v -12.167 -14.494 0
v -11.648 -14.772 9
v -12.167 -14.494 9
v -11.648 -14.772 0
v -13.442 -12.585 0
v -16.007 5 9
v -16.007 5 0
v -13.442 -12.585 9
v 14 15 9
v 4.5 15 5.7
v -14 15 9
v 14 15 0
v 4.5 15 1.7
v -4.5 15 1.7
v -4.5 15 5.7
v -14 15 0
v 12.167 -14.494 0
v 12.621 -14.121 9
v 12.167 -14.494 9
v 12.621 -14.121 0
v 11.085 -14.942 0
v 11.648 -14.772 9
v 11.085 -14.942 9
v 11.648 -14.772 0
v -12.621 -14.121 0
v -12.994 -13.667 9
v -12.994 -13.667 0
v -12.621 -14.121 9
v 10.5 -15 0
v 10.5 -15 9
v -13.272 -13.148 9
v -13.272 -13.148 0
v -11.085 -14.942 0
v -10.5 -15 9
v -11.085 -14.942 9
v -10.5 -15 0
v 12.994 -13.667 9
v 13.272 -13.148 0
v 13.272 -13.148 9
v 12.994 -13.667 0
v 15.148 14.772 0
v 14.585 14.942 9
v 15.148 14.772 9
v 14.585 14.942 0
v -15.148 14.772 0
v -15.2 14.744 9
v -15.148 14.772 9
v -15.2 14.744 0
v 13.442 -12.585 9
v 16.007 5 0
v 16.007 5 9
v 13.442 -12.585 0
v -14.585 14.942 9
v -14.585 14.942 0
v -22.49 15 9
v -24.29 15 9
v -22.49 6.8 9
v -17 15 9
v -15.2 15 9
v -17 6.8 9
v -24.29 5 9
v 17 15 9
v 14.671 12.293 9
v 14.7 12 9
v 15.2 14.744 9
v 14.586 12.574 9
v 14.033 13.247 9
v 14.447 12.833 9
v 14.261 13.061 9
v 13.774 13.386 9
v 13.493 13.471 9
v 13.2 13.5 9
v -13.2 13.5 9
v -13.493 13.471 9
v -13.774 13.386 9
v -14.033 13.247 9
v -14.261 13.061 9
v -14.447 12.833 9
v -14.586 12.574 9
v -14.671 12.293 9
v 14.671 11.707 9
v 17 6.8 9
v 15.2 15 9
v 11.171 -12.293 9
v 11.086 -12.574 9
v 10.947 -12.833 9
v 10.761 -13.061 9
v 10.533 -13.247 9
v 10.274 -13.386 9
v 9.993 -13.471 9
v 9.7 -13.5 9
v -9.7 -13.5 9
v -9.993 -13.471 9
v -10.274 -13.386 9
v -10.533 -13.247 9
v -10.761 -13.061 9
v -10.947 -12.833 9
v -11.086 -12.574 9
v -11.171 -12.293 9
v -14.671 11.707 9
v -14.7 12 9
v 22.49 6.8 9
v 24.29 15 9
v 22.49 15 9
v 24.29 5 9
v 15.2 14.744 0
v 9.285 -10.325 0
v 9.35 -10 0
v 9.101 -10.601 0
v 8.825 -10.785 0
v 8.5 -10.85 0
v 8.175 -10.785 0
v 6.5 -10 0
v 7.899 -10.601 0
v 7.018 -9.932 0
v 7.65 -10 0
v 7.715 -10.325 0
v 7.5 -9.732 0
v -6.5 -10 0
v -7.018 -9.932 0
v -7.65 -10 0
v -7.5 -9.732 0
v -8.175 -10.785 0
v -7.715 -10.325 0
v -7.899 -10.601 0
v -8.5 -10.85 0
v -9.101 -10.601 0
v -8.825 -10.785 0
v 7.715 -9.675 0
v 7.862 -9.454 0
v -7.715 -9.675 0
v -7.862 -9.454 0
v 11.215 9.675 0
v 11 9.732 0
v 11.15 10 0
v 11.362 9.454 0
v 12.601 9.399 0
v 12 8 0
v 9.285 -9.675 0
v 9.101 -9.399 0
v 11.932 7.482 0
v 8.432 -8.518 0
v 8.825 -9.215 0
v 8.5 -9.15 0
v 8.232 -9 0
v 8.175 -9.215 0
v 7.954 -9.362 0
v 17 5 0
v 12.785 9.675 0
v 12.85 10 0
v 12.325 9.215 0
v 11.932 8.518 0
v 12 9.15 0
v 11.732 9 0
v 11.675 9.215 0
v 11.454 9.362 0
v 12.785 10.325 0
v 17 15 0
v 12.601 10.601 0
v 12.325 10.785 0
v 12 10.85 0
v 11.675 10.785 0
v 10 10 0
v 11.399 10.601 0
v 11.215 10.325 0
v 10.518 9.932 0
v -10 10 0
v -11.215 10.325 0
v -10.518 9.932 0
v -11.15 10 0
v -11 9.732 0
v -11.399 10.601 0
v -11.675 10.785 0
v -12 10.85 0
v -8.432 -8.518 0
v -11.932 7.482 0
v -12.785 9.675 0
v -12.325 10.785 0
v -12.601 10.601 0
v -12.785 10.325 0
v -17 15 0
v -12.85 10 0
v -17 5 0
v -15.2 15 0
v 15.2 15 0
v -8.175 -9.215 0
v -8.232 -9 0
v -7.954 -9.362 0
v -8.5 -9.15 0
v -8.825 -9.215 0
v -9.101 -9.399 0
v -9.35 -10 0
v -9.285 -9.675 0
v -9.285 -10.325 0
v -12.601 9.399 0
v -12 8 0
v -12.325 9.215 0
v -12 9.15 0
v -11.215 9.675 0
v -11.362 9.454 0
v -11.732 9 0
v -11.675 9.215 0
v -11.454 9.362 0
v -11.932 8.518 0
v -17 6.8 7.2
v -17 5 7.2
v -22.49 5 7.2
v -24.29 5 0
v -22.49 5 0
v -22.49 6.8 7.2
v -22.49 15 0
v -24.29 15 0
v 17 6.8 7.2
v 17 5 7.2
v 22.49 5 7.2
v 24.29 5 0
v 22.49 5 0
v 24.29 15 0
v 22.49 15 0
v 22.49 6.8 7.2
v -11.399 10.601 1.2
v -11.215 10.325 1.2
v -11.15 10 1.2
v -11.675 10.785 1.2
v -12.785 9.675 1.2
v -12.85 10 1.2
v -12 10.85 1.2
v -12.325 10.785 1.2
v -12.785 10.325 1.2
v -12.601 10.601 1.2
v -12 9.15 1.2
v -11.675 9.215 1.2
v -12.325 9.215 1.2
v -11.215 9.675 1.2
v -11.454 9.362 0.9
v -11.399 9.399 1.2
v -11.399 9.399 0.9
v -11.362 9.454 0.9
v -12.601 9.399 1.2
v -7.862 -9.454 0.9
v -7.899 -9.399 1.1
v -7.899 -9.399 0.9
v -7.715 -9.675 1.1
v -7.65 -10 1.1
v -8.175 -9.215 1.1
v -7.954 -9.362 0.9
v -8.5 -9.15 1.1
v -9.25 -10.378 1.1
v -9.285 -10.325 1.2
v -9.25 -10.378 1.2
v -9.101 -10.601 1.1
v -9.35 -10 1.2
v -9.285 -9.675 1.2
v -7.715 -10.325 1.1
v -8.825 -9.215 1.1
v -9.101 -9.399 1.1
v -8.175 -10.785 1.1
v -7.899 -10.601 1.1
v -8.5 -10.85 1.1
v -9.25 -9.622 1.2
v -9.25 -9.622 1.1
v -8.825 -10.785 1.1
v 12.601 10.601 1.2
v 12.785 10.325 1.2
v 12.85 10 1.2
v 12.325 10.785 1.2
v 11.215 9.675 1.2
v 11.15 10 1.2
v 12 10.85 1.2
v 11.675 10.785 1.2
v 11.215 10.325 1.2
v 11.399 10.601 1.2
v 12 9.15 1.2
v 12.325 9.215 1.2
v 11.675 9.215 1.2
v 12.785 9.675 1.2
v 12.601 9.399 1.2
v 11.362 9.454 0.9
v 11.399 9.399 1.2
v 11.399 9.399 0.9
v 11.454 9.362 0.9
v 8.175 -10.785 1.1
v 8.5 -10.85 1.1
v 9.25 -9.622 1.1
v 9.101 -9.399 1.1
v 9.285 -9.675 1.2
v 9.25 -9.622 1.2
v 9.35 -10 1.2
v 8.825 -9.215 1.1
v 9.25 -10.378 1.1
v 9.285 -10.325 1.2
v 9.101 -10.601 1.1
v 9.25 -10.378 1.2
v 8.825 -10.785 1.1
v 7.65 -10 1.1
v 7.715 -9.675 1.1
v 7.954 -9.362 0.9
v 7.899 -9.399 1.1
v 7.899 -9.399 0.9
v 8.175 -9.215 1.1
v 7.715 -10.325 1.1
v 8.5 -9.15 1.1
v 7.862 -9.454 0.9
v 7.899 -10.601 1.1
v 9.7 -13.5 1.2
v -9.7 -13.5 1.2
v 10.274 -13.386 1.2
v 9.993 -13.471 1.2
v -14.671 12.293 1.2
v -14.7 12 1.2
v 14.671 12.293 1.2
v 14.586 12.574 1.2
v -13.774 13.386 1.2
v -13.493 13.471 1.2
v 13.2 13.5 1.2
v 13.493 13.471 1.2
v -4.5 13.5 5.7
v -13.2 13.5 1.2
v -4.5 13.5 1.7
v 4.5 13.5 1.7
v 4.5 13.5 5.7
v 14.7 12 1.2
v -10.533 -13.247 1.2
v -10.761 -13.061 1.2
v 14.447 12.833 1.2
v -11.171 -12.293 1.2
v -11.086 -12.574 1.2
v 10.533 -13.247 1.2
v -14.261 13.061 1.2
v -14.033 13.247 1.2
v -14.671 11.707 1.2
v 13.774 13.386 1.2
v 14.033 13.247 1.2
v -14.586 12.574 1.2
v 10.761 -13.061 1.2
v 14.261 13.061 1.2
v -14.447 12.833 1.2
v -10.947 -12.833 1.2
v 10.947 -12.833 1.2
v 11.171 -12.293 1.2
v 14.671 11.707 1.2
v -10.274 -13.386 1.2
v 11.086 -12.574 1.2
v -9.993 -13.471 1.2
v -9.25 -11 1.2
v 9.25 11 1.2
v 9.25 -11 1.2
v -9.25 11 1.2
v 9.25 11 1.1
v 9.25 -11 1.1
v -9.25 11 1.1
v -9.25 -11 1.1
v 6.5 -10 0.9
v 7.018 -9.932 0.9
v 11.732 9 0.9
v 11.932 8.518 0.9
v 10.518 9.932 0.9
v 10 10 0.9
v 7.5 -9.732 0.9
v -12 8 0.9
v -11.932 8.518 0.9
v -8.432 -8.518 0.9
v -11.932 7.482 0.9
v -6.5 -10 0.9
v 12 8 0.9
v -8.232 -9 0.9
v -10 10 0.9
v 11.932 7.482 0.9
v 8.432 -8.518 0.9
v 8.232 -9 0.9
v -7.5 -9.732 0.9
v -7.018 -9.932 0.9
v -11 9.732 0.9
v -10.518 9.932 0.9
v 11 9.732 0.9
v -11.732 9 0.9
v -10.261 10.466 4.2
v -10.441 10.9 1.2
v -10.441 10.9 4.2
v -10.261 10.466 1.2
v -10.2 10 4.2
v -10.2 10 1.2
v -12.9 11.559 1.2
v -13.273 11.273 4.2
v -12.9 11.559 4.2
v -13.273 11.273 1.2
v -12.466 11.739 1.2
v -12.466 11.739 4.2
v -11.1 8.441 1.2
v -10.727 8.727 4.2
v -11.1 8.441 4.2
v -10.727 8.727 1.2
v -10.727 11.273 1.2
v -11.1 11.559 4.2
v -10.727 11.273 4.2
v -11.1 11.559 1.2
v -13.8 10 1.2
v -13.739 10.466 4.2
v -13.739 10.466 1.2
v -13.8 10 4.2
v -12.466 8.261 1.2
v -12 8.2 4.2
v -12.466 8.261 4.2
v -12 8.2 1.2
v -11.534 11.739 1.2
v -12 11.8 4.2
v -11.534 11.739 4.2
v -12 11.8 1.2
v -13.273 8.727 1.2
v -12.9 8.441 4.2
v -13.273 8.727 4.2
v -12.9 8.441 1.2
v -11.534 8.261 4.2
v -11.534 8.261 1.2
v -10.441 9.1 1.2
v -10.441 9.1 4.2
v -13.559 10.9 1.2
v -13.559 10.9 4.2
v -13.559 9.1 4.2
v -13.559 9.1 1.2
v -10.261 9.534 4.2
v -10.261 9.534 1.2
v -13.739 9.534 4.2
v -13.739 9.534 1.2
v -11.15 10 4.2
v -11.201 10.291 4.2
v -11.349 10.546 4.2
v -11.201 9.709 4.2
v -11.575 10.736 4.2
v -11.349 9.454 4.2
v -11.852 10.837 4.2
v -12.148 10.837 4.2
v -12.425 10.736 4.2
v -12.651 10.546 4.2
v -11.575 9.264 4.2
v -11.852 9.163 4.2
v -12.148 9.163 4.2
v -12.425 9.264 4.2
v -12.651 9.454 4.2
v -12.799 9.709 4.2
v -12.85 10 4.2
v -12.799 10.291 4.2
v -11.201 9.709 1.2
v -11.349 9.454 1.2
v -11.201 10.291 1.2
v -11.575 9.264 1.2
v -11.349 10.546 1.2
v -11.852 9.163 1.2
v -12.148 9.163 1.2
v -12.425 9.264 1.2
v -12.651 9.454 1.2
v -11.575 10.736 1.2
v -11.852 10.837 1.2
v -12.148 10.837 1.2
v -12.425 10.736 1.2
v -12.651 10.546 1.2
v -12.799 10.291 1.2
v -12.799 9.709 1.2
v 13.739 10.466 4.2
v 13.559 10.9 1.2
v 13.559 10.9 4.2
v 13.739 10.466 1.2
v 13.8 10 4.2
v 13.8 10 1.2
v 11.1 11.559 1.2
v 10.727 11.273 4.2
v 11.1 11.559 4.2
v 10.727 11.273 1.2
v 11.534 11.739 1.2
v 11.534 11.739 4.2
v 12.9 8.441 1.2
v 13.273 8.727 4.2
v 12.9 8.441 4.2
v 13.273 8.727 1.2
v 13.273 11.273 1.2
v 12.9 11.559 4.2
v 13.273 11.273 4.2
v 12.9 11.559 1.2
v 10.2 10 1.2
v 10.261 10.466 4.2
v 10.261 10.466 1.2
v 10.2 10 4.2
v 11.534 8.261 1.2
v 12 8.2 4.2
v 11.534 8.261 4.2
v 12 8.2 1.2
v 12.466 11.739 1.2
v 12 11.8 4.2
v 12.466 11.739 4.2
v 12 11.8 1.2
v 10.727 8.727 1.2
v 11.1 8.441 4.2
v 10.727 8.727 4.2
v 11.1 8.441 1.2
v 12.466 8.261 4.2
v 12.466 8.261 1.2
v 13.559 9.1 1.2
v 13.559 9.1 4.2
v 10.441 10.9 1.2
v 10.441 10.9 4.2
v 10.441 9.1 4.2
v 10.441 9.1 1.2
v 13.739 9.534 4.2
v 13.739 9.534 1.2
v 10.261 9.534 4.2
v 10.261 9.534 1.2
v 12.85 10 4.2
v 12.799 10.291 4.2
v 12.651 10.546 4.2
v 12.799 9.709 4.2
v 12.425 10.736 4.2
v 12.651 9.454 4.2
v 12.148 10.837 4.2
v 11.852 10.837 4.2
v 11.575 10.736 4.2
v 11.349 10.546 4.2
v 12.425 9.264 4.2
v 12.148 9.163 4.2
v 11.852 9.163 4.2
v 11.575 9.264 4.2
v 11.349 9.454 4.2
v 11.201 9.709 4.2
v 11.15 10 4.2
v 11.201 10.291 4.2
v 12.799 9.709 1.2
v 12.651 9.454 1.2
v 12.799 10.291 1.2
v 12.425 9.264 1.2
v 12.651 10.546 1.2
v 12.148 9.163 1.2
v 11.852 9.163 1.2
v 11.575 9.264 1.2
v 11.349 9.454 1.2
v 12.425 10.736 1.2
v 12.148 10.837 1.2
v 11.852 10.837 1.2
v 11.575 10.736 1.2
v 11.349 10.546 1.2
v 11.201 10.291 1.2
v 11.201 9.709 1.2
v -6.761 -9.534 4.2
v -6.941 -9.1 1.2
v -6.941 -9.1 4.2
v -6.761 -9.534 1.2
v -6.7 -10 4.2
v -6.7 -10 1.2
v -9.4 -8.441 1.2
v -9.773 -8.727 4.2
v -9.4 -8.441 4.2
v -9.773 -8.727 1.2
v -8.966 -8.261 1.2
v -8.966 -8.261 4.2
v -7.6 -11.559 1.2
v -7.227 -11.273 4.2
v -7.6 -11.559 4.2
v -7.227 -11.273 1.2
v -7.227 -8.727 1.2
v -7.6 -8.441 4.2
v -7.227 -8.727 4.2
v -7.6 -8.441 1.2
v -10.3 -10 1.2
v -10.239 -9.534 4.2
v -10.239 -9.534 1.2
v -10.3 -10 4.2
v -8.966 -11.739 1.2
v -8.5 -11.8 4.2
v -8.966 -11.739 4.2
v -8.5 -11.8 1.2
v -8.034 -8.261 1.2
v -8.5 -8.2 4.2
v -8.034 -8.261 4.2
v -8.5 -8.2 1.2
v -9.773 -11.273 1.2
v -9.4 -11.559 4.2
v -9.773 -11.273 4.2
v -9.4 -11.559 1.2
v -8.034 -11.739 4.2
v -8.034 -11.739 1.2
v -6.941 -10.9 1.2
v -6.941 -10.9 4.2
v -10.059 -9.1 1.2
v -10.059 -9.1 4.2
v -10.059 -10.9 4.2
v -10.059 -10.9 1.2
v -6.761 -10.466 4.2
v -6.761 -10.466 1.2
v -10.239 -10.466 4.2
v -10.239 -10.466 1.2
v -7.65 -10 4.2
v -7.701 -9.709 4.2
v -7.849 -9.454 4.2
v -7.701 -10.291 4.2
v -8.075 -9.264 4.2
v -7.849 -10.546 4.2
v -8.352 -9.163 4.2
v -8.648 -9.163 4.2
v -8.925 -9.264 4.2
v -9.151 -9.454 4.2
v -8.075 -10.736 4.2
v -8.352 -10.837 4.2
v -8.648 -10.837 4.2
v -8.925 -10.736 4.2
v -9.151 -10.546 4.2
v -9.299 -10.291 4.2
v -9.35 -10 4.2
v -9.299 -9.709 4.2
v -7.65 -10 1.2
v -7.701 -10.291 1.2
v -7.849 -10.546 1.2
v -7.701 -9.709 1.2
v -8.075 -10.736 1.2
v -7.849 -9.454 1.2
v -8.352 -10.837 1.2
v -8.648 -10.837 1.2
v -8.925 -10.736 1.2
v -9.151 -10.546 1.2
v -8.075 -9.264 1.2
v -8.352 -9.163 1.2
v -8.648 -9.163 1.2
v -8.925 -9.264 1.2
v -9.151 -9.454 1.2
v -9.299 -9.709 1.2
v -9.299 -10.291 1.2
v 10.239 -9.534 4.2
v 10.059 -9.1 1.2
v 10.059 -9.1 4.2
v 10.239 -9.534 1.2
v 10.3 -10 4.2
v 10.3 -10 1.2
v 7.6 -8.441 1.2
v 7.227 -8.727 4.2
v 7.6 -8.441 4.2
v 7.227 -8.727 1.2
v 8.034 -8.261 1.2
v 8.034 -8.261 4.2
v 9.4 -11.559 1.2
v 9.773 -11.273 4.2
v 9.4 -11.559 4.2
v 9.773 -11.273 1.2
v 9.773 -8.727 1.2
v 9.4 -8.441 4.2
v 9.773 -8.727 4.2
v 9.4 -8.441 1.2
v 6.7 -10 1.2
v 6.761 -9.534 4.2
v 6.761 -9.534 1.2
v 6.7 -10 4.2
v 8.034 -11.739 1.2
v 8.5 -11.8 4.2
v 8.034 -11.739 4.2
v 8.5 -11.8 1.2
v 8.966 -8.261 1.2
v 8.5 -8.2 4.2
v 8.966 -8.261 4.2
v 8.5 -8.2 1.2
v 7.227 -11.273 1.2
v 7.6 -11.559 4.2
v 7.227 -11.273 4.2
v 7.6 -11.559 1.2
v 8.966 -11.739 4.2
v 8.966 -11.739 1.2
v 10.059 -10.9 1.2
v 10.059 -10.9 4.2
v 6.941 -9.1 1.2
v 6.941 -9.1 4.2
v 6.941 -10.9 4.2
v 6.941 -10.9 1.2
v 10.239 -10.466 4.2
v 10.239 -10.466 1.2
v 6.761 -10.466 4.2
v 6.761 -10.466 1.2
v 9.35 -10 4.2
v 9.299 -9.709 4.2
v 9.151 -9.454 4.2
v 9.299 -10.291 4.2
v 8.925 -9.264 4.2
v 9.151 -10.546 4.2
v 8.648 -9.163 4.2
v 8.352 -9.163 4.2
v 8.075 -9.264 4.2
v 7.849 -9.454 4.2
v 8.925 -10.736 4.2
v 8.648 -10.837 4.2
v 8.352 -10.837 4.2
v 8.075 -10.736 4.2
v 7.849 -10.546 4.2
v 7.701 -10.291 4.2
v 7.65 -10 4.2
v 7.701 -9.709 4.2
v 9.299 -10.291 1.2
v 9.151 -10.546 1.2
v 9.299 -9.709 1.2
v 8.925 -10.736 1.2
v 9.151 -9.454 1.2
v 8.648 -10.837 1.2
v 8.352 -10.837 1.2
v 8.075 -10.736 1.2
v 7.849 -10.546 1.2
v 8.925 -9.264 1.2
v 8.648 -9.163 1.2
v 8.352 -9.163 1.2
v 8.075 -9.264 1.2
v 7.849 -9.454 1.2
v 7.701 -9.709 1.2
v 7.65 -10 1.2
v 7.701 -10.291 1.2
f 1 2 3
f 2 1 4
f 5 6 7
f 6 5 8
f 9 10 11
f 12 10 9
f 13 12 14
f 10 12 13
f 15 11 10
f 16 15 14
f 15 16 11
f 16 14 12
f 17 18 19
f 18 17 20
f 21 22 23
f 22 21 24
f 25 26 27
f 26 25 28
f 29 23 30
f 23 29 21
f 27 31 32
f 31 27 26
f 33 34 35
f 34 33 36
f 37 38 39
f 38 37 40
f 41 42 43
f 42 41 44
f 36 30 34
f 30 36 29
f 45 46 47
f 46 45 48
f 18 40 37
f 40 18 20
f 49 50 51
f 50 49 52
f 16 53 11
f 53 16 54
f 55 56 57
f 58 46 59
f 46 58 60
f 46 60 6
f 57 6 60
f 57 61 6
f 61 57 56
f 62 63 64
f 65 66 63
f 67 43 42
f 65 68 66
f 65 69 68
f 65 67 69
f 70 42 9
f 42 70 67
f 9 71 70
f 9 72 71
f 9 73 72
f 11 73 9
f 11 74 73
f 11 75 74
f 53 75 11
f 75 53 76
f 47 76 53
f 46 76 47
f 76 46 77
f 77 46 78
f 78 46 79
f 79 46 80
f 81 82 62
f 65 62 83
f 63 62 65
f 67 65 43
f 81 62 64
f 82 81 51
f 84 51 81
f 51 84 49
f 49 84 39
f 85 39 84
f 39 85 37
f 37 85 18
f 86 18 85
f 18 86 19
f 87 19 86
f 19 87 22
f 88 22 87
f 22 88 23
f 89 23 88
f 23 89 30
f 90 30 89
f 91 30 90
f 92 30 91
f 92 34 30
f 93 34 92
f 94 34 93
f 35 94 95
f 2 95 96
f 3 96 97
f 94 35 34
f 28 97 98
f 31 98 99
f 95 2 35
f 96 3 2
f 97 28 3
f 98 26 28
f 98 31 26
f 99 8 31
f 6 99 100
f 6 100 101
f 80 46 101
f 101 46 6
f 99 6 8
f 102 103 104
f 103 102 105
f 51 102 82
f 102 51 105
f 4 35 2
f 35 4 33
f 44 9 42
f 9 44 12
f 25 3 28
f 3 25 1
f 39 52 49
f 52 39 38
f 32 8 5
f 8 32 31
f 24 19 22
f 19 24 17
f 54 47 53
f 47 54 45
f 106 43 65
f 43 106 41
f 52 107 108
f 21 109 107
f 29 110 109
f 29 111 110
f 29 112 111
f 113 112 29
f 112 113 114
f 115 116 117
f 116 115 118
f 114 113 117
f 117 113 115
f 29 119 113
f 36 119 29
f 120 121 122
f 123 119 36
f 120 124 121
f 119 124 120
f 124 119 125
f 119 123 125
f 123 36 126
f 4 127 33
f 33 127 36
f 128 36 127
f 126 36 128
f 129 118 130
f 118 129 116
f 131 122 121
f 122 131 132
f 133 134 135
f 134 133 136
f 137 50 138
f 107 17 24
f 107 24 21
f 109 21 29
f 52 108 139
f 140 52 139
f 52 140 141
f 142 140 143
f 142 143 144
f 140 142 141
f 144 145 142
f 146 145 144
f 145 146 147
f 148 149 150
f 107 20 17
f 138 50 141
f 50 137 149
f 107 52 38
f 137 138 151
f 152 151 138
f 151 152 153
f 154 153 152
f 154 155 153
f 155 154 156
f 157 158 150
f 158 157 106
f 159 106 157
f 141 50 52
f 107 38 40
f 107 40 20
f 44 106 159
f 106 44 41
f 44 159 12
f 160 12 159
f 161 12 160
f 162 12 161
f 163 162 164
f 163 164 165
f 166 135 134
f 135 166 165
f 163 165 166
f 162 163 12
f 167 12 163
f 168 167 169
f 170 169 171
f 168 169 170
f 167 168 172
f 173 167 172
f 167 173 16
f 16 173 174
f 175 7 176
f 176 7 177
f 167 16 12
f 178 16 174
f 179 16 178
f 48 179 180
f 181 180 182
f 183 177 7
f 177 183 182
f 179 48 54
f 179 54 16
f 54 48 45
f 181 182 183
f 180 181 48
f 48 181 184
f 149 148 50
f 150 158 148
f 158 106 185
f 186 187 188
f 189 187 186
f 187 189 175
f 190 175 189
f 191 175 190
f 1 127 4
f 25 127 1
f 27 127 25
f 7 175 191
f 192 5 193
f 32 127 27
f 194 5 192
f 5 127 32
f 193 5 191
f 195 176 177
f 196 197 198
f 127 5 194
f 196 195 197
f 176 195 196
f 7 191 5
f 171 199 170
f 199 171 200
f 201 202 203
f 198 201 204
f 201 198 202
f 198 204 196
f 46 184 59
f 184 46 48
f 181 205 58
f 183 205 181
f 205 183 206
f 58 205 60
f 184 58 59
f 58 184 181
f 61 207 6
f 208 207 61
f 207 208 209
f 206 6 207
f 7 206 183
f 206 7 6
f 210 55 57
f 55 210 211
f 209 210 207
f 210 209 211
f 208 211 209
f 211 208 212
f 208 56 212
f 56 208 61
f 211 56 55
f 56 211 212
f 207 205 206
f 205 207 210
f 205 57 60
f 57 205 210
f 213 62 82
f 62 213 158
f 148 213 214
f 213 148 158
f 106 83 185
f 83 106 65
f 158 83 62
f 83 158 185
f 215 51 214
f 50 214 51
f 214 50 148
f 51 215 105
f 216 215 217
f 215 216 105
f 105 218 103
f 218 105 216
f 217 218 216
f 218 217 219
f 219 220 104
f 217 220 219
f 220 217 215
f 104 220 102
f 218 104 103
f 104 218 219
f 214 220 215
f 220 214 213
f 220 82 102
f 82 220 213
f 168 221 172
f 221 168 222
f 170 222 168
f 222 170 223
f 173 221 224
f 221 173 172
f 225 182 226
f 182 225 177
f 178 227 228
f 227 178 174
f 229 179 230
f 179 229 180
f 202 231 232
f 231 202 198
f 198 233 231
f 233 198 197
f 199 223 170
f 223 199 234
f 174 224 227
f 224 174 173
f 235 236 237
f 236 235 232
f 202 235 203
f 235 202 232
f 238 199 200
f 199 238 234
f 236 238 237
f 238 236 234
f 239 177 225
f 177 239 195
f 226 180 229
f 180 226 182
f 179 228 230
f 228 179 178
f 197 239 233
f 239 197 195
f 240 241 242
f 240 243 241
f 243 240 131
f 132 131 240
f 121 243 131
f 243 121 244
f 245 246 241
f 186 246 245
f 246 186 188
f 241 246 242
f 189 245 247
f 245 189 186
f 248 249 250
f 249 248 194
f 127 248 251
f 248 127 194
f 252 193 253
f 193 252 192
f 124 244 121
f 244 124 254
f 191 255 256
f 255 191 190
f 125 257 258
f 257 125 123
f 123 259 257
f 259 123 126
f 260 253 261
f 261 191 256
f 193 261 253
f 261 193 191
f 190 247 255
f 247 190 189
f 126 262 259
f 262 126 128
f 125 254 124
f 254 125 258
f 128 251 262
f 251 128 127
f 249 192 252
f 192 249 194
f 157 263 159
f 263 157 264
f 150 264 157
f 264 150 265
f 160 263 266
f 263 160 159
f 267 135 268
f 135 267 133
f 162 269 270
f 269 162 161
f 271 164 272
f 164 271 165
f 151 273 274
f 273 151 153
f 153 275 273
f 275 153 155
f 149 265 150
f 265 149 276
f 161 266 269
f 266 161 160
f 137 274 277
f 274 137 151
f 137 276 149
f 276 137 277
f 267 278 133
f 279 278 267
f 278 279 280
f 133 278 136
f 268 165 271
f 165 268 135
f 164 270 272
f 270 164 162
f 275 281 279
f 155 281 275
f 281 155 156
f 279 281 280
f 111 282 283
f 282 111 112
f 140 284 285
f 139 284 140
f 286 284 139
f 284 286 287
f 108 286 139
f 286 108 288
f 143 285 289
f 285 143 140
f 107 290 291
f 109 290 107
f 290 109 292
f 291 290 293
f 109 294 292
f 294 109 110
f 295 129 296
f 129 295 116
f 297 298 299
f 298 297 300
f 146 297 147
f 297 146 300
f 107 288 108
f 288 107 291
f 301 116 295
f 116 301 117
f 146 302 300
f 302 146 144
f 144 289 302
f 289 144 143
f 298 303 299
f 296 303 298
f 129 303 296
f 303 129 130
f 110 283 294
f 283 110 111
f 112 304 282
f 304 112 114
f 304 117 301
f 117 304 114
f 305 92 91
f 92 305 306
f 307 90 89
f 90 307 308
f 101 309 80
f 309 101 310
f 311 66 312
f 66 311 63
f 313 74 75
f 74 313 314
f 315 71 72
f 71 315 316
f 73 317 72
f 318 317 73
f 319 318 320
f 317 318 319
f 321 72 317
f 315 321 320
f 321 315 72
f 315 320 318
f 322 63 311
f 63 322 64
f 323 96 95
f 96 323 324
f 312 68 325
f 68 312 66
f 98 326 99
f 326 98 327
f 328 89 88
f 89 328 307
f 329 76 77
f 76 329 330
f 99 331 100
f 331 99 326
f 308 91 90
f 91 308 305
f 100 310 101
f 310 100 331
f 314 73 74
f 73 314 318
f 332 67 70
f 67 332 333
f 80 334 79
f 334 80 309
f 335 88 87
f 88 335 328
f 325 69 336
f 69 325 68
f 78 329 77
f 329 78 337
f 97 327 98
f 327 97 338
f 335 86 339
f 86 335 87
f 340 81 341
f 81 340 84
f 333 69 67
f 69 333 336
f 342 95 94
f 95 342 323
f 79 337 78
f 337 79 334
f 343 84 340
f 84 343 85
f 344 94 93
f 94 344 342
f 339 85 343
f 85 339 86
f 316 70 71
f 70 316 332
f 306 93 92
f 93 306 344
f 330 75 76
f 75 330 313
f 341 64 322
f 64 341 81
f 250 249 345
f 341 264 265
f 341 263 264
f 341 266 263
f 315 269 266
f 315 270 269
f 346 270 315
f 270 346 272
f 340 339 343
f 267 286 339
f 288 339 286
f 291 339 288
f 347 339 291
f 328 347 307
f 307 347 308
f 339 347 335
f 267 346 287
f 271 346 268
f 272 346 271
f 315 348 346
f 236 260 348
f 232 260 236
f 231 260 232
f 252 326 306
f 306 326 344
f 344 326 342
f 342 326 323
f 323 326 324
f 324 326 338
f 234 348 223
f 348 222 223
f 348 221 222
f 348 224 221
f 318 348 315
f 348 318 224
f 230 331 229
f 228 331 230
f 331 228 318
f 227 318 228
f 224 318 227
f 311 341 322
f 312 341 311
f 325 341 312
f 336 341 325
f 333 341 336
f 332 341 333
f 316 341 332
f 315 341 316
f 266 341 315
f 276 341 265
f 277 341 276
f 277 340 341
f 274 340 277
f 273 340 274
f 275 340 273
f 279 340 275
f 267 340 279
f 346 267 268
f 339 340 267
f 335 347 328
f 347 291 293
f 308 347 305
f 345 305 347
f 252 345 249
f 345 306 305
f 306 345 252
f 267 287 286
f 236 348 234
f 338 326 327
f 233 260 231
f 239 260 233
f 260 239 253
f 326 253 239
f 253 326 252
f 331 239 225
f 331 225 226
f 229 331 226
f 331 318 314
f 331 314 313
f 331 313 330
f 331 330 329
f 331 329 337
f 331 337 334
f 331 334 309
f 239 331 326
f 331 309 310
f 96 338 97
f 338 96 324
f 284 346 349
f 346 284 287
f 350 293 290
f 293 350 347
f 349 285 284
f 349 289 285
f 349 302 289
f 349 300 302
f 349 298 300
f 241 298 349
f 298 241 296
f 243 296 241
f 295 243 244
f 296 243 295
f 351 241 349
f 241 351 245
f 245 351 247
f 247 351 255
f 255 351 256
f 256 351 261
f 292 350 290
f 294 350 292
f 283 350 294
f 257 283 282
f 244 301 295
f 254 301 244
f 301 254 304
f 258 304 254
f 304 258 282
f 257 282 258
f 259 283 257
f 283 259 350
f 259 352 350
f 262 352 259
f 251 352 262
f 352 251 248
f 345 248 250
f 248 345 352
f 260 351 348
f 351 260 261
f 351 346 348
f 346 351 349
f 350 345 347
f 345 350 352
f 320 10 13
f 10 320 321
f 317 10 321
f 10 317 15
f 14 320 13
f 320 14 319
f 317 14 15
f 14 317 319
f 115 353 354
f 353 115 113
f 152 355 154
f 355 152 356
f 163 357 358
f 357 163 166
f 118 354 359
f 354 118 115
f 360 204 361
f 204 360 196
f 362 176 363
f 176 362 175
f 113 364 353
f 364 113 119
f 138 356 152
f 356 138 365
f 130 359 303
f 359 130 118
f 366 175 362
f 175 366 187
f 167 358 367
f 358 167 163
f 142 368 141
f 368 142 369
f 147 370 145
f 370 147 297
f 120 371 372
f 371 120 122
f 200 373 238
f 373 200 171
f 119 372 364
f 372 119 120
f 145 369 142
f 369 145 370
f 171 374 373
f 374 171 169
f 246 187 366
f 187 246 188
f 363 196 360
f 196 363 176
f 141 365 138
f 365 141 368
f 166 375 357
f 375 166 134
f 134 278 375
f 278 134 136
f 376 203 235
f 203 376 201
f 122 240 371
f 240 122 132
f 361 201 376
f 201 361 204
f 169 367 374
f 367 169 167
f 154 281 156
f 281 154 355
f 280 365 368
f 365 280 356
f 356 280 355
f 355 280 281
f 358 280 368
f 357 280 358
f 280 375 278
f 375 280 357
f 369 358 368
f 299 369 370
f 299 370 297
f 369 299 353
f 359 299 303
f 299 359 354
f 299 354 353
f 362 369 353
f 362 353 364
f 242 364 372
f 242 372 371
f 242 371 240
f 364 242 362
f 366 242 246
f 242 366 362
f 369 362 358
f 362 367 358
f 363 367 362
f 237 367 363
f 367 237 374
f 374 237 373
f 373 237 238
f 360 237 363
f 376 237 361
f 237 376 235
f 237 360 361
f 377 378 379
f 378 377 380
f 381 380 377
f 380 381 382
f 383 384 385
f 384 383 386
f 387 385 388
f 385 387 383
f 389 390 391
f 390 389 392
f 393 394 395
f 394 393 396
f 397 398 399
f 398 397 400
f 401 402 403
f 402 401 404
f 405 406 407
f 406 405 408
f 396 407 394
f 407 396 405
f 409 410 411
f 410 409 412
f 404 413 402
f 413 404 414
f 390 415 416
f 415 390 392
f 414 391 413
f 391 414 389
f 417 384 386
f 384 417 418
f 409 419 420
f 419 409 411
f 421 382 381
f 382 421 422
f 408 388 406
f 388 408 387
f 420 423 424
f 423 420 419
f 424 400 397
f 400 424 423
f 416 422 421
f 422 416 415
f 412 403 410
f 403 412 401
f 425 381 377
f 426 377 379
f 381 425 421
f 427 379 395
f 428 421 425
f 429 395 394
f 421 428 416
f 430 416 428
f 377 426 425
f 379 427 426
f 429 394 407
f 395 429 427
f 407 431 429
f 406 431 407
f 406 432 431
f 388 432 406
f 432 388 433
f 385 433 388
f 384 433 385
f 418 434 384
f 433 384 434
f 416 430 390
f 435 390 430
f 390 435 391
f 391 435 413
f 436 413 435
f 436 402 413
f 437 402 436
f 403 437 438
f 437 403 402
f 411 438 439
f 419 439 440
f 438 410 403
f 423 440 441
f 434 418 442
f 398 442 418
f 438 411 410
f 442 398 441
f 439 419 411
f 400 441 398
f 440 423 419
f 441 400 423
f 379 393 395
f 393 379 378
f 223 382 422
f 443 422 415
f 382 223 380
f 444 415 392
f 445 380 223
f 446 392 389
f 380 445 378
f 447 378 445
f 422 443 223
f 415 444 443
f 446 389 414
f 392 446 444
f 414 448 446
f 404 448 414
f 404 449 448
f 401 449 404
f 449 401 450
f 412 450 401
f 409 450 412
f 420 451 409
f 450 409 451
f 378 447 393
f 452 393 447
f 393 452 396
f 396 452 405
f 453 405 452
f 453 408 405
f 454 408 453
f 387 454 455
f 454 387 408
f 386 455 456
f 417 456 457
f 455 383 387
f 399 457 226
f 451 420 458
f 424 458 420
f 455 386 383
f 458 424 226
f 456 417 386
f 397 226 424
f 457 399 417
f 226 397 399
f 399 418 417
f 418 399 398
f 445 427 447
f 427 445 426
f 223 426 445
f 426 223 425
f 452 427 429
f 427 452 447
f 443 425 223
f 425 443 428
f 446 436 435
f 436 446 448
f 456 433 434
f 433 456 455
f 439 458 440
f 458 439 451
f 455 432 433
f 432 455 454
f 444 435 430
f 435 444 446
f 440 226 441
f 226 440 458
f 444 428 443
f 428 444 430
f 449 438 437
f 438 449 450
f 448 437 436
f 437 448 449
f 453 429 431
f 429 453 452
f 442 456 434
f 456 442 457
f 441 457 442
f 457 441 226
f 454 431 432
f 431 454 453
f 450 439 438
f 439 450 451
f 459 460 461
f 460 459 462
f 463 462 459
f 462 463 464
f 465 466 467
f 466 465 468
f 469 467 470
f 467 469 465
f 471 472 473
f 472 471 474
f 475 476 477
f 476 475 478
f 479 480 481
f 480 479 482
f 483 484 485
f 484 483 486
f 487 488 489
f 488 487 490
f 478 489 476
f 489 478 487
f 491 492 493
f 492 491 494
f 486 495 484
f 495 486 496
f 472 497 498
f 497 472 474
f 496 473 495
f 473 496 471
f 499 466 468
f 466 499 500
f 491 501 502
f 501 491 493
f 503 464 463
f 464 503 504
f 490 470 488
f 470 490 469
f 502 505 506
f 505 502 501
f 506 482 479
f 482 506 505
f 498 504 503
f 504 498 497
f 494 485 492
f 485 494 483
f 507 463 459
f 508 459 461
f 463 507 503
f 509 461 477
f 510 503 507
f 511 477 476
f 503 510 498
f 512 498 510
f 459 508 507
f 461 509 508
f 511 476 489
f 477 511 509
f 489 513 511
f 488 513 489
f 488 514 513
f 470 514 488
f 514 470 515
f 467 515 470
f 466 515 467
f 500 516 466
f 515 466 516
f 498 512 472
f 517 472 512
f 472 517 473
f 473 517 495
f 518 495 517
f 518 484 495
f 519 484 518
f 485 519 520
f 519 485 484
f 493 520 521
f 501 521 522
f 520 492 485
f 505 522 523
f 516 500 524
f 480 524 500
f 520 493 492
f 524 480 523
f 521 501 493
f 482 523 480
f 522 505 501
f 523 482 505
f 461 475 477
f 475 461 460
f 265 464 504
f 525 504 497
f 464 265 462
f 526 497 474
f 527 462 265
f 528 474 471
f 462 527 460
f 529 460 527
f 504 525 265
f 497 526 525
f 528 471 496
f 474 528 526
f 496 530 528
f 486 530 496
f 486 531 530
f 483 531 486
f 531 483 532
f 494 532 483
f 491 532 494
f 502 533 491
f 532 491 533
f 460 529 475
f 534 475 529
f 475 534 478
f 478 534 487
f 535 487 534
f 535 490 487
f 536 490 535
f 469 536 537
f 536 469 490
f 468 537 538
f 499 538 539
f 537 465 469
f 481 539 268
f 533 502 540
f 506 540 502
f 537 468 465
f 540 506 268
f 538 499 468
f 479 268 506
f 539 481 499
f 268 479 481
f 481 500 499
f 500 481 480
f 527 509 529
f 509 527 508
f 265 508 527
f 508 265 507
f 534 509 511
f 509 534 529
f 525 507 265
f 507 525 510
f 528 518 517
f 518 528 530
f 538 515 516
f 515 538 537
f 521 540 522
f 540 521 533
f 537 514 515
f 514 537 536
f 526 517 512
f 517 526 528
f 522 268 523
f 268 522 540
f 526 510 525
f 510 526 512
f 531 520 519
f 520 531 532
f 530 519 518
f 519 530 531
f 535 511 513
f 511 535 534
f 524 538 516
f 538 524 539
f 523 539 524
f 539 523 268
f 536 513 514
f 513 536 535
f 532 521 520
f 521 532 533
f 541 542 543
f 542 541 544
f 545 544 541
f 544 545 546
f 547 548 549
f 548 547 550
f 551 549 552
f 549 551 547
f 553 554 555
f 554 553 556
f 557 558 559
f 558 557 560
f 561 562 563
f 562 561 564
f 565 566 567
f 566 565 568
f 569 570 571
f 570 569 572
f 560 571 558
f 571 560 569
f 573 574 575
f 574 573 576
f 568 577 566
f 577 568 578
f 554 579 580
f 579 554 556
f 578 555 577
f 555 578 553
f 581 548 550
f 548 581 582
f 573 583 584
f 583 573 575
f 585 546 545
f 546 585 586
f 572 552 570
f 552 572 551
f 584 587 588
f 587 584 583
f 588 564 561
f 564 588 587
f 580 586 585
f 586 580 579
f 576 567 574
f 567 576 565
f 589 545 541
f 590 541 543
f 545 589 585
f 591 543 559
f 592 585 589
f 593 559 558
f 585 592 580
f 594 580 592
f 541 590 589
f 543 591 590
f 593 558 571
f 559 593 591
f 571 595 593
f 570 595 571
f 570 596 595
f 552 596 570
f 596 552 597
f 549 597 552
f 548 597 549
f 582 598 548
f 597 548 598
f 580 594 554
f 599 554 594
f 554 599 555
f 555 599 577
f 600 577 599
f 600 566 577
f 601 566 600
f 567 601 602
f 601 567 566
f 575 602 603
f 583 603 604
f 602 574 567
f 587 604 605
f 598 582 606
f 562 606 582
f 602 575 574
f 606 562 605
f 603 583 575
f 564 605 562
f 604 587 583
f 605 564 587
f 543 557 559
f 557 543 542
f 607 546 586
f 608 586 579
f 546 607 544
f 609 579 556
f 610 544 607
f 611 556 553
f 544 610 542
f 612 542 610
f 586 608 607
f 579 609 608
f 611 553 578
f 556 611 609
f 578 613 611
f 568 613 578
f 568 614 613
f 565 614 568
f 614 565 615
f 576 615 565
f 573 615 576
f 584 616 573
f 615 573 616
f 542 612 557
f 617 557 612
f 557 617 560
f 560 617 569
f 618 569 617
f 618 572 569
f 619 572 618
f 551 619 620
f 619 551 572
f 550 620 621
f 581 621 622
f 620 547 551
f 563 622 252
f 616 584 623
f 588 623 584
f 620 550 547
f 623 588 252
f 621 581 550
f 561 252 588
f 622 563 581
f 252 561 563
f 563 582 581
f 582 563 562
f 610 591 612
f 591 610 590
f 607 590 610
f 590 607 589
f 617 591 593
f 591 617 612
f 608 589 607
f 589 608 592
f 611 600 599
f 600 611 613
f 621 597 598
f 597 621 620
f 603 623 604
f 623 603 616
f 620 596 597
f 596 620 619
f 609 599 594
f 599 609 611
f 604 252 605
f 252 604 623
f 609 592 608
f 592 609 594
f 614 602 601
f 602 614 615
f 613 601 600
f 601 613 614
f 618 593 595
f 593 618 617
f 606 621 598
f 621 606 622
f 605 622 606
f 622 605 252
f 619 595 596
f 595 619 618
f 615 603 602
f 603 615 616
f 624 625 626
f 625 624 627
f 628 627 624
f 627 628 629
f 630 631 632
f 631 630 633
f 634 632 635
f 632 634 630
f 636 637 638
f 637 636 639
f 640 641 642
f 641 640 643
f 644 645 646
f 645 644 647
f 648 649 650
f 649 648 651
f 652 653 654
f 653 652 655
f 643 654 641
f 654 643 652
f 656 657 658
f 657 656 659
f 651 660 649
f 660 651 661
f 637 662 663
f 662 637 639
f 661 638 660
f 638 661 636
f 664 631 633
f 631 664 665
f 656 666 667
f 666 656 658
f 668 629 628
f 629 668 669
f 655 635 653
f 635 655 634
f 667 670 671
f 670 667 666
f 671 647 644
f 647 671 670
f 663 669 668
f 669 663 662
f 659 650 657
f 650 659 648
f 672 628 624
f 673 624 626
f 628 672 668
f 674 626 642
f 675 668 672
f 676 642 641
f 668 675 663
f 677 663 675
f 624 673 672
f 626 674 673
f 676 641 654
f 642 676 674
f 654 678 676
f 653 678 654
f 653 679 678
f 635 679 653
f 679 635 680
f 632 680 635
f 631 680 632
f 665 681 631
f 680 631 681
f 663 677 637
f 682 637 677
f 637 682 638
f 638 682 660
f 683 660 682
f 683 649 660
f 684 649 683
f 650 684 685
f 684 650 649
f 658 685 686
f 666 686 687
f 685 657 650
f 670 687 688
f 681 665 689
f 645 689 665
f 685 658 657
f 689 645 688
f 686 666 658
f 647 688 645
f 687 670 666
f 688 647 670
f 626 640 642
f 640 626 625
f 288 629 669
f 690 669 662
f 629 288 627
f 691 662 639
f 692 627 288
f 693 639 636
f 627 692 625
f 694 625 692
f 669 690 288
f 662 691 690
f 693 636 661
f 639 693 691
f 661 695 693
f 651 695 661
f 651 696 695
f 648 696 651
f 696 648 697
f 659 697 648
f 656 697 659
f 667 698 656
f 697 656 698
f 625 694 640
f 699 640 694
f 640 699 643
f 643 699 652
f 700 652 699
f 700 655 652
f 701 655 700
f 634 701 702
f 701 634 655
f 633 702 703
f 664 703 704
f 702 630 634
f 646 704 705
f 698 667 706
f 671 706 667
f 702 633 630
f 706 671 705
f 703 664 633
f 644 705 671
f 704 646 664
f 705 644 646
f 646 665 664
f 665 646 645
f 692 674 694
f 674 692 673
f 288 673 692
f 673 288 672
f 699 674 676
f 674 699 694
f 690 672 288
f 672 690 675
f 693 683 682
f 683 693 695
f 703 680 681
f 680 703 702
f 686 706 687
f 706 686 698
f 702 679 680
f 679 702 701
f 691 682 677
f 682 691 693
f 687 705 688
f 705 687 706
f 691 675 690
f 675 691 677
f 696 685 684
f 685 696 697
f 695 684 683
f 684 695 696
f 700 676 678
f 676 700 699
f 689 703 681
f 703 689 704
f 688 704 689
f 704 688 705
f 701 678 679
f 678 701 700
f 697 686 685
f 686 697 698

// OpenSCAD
// ============================================================
// PickleScore™ Throat Pod Enclosure — v4.0  2-BUTTON / LIPO
// Parametric OpenSCAD model
// ============================================================
// WHAT'S NEW IN v2.0:
//   - Tapered trapezoid body matching JOOLA Perseus throat taper
//   - Top width 65mm (at USA Approved level), bottom 27mm (grip collar)
//   - Height 65mm total — extends slightly above 25mm gap for fit
//   - Slim 7mm total thickness (down from 9mm in v1)
//   - XIAO nRF52840 oriented lengthwise (21mm along pod height)
//   - CR2032 holder stacked above XIAO chip (vertical stack layout)
//   - Clip arms at TOP of pod only (widest point, best grip)
//   - Full-length VHB pad on back face for secondary adhesion
//   - Buttons repositioned for tapered face geometry
// ============================================================
// PHASE 2 NOTE:
//   This design uses the Seeed XIAO nRF52840 (21×17.5mm)
//   for prototype builds. Phase 3 production will swap to
//   the Raytac MDBT50Q bare module (15.5×10.5×2mm) on a
//   custom PCB — enabling a pod that fits entirely within
//   the 25mm grip transition zone.
// ============================================================
// PRINT SETTINGS:
//   Material:      TPU 95A
//   Layer height:  0.15mm
//   Infill:        30% gyroid
//   Supports:      None needed
//   Orientation:
//     Top shell   → print face-down (buttons facing bed)
//     Bottom shell → print flat-side-down
// ============================================================
// TO USE:
//   SHOW = "assembly"    — full preview with components
//   SHOW = "top"         — top shell only (export STL)
//   SHOW = "bottom"      — bottom shell only (export STL)
// ============================================================

SHOW = "bottom";   // "assembly" | "top" | "bottom"

// ── Tapered body dimensions ──────────────────────────────────
// Trapezoid: wide at top (paddle face level), narrow at bottom (grip)
pod_h      = 30;    // mm — LiPo (25mm) + margins
pod_top_w  = 34;    // mm — 2-button layout, verify against paddle throat
pod_bot_w  = 27;    // mm — measured throat width
pod_thk    = 11;    // mm — floor(1.2) + XIAO(4) + LiPo(3.5) + top(1.8) stacked

// ── Shell thicknesses ────────────────────────────────────────
wall_t   = 1.8;  // mm — outer wall thickness all sides
top_t    = 1.8;  // mm — button face shell thickness
bot_h    =  9;  // mm — floor(1.2) + XIAO(4) + LiPo(3.5) stacked
floor_t  = 1.2;  // mm — bottom floor thickness

// ── Clip arms (grip paddle edge — TOP of pod only) ───────────
clip_gap    =  5.49; // mm — JOOLA Perseus edge guard height (measured)
clip_len    = 10.0;  // mm — arm length reaching over edge
clip_thk    =  1.8;  // mm — arm wall thickness
clip_offset = 10.0;  // mm — inset from left/right ends at top

// ── Button hole1s (inverted-triangle on tapered face) ─────────
// Positioned in upper portion of pod face, centered
btn_A_x  =  -8;  btn_A_y =   5;  btn_A_r = 5.0;  // Red  (left)  — short press = A scores, long = undo, 3s = reset
btn_B_x  =   8;  btn_B_y =   5;  btn_B_r = 5.0;  // Blue (right) — short press = B scores, long = undo, 3s = reset

// ── XIAO nRF52840 pocket (oriented lengthwise) ───────────────
// Board: 21mm long × 17.5mm wide × 3.5mm thick
// Positioned in upper half of pod
xiao_len  = 22.0;  // mm — board length + 0.5mm clearance
xiao_wid  = 18.5;  // mm — board width + 1mm clearance
xiao_thk  =  4.0;  // mm — board + component height
xiao_y    =  0;  // mm — centered in pod
xiao_x    =  0;  // mm — centered in pod
usbc_w    =  9.0;  // mm — USB-C cutout width
usbc_h    =  4.0;  // mm — USB-C cutout height

// ── LiPo battery (stacked above XIAO in z) ───────────────────
// Target: 301230 (3mm × 12mm × 30mm, ~90mAh)
// XIAO nRF52840 has built-in LiPo charger — USB-C charges both
lipo_len   = 26.0;  // mm — 25mm cell + 1mm clearance
lipo_wid   = 13.0;  // mm — 12mm cell + 1mm clearance
lipo_thk   =  3.5;  // mm — 3mm cell + 0.5mm clearance
lipo_y     =    0;  // mm — centered in pod
lipo_x     =    0;  // mm — centered in pod

// ── VHB adhesive pad recess (full back face) ─────────────────
// Slightly inset from edges for clean appearance
pad_margin = 4;    // mm — margin from pod edge
pad_depth  = 0.8;  // mm — recess depth

// ── Screw bosses (M1.6) ──────────────────────────────────────
boss_r     = 1.8;
boss_h     = 3.0;
screw_r    = 0.85;
boss_inset_x = 5.0;  // mm from left/right edge
boss_inset_y = 5.0;  // mm from top/bottom edge

// ── Fillet radius ─────────────────────────────────────────────
fillet_r = 3.0;

// ============================================================
// TRAPEZOID HELPER
// The pod tapers linearly from pod_top_w at top (y = +pod_h/2)
// to pod_bot_w at bottom (y = -pod_h/2).
// width_at(y) returns the pod half-width at a given y position.
// ============================================================

function width_at(y) =
    (pod_top_w/2) * (0.5 + y/pod_h) +
    (pod_bot_w/2) * (0.5 - y/pod_h);

// Build tapered body using hull of rounded boxes at top and bottom
module tapered_body(thk) {
    hull() {
        // Top end — full top width
        translate([0, pod_h/2 - fillet_r, 0])
            hull() {
                for (sx = [-1, 1])
                    translate([sx * (pod_top_w/2 - fillet_r), 0, 0])
                        cylinder(r=fillet_r, h=thk, $fn=32);
            }
        // Bottom end — narrow bottom width
        translate([0, -(pod_h/2 - fillet_r), 0])
            hull() {
                for (sx = [-1, 1])
                    translate([sx * (pod_bot_w/2 - fillet_r), 0, 0])
                        cylinder(r=fillet_r, h=thk, $fn=32);
            }
    }
}

// Interior hollow — walls on all sides
module tapered_hollow(thk) {
    hull() {
        translate([0, pod_h/2 - fillet_r, 0])
            hull() {
                for (sx = [-1, 1])
                    translate([sx * (pod_top_w/2 - wall_t - fillet_r + 1), 0, 0])
                        cylinder(r=max(fillet_r-1.5, 1), h=thk+0.2, $fn=32);
            }
        translate([0, -(pod_h/2 - fillet_r), 0])
            hull() {
                for (sx = [-1, 1])
                    translate([sx * (pod_bot_w/2 - wall_t - fillet_r + 1), 0, 0])
                        cylinder(r=max(fillet_r-1.5, 1), h=thk+0.2, $fn=32);
            }
    }
}

// Screw boss at position
module screw_boss(x, y, z_base) {
    translate([x, y, z_base])
        difference() {
            cylinder(r=boss_r, h=boss_h, $fn=24);
            cylinder(r=screw_r, h=boss_h+0.1, $fn=18);
        }
}

// ============================================================
// TOP SHELL (button face)
// ============================================================
module top_shell() {
    difference() {
        // Outer tapered body
        tapered_body(top_t + 1.5);

        // Interior hollow
        translate([0, 0, top_t])
            tapered_hollow(top_t + 2);

        // Button A — 0.8mm TPU membrane dome (tactile switch presses from inside)
        translate([btn_A_x, btn_A_y, 0.8])
            cylinder(r=btn_A_r, h=top_t + 2.6, $fn=32);

        // Button B — 0.8mm TPU membrane dome
        translate([btn_B_x, btn_B_y, 0.8])
            cylinder(r=btn_B_r, h=top_t + 2.6, $fn=32);

    }
}

// ============================================================
// BOTTOM SHELL (component housing)
// ============================================================
module bottom_shell() {
    difference() {
        union() {
            // Main tapered body
            tapered_body(bot_h);

            // Clip arms — TOP edge of pod only (widest point)
            // Left clip arm pair
            translate([-(pod_top_w/2), pod_h/2 - clip_len, 0])
                cube([clip_thk, clip_len, bot_h]);
            translate([-(pod_top_w/2 + clip_gap + clip_thk), pod_h/2 - clip_len, 0])
                cube([clip_thk, clip_len, bot_h]);
            // Horizontal connector top of left clip
            translate([-(pod_top_w/2 + clip_gap + clip_thk), pod_h/2 - clip_len, bot_h - clip_thk])
                cube([clip_gap + clip_thk*2, clip_thk, clip_thk]);

            // Right clip arm pair
            translate([(pod_top_w/2 - clip_thk), pod_h/2 - clip_len, 0])
                cube([clip_thk, clip_len, bot_h]);
            translate([(pod_top_w/2 + clip_gap), pod_h/2 - clip_len, 0])
                cube([clip_thk, clip_len, bot_h]);
            // Horizontal connector top of right clip
            translate([(pod_top_w/2 - clip_thk), pod_h/2 - clip_len, bot_h - clip_thk])
                cube([clip_gap + clip_thk*2, clip_thk, clip_thk]);
        }

        // Interior hollow
        translate([0, 0, floor_t])
            tapered_hollow(bot_h);

        // XIAO nRF52840 pocket (upper half, lengthwise)
       translate([xiao_x - xiao_wid/2, xiao_y - xiao_len/2, floor_t - 0.1])
            cube([xiao_wid, xiao_len, xiao_thk + 0.1]);

        // USB-C port — through top wall (programs XIAO + charges LiPo)
        translate([xiao_x - usbc_w/2, pod_h/2 - wall_t - 0.1, floor_t + 0.5])
            cube([usbc_w, wall_t + 0.3, usbc_h]);

        // LiPo pocket — above XIAO in z (stacked)
        translate([lipo_x - lipo_wid/2, lipo_y - lipo_len/2, floor_t + xiao_thk])
            cube([lipo_wid, lipo_len, lipo_thk + 0.1]);

        // VHB tape recess on back face (full-length, inset from edges)
        hull() {
            translate([0, pod_h/2 - pad_margin - fillet_r, -0.1])
                hull() {
                    for (sx=[-1,1])
                        translate([sx*(pod_top_w/2 - pad_margin - fillet_r), 0, 0])
                            cylinder(r=fillet_r-1, h=pad_depth+0.2, $fn=24);
                }
            translate([0, -(pod_h/2 - pad_margin - fillet_r), -0.1])
                hull() {
                    for (sx=[-1,1])
                        translate([sx*(pod_bot_w/2 - pad_margin - fillet_r), 0, 0])
                            cylinder(r=fillet_r-1, h=pad_depth+0.2, $fn=24);
                }
        }

        // Screw holes (4 corners matched to top shell bosses)
        for (sx=[-1,1]) {
            translate([sx*(pod_top_w/2 - boss_inset_x), pod_h/2 - boss_inset_y, -0.1])
                cylinder(r=screw_r, h=floor_t+0.2, $fn=16);
            translate([sx*(pod_bot_w/2 - boss_inset_x), -(pod_h/2 - boss_inset_y), -0.1])
                cylinder(r=screw_r, h=floor_t+0.2, $fn=16);
        }
    }

    // Screw bosses at 4 corners (adapting to taper)
    screw_boss(-(pod_top_w/2 - boss_inset_x),  pod_h/2 - boss_inset_y,  floor_t);
    screw_boss( (pod_top_w/2 - boss_inset_x),  pod_h/2 - boss_inset_y,  floor_t);
    screw_boss(-(pod_bot_w/2 - boss_inset_x), -(pod_h/2 - boss_inset_y), floor_t);
    screw_boss( (pod_bot_w/2 - boss_inset_x), -(pod_h/2 - boss_inset_y), floor_t);
}

// ============================================================
// ASSEMBLY PREVIEW
// ============================================================
module assembly() {
    // Top shell (button face)
    color("DarkSlateGray", 0.9)
        translate([0, 0, bot_h])
            top_shell();

    // Bottom shell
    color("SlateGray", 0.85)
        translate([0, 0, 0])
            bottom_shell();

    // Tactile switches — 6×6×5mm, seated under membrane domes
    color("DimGray", 0.9) {
        translate([btn_A_x - 3, btn_A_y - 3, bot_h + 0.8])
            cube([6, 6, 5]);
        translate([btn_B_x - 3, btn_B_y - 3, bot_h + 0.8])
            cube([6, 6, 5]);
    }

    // XIAO nRF52840 board
    color("ForestGreen", 0.8)
        translate([xiao_x - xiao_wid/2, xiao_y - xiao_len/2, floor_t + 0.2])
            cube([xiao_wid, xiao_len, xiao_thk]);

    // LiPo battery (stacked above XIAO)
    color("SteelBlue", 0.75)
        translate([lipo_x - lipo_wid/2, lipo_y - lipo_len/2, floor_t + xiao_thk + 0.2])
            cube([lipo_wid, lipo_len, lipo_thk]);

    // VHB tape pad visualization
    color("Black", 0.4)
        translate([0, 0, -0.5])
            hull() {
                translate([0, pod_h/2 - pad_margin - fillet_r, 0])
                    hull() {
                        for (sx=[-1,1])
                            translate([sx*(pod_top_w/2-pad_margin-fillet_r),0,0])
                                cylinder(r=fillet_r-1, h=0.6, $fn=20);
                    }
                translate([0, -(pod_h/2-pad_margin-fillet_r), 0])
                    hull() {
                        for (sx=[-1,1])
                            translate([sx*(pod_bot_w/2-pad_margin-fillet_r),0,0])
                                cylinder(r=fillet_r-1, h=0.6, $fn=20);
                    }
            }
}

// ============================================================
// RENDER
// ============================================================
if      (SHOW == "top")     top_shell();
else if (SHOW == "bottom")  bottom_shell();
else                        assembly();

// ============================================================
// QUICK REFERENCE — Key dimensions  (v4.0)
// ============================================================
// Pod exterior:        34mm wide (top) → 27mm wide (bottom) × 30mm tall × 11mm thick
// vs v2.1 original:    was 44 × 13mm × 38mm  (~52% volume reduction)
// Taper follows:       JOOLA Perseus throat — verify pod_top_w against your paddle
// Button layout:       2-button — Red (left) Blue (right), centered on face
//   Short press:       score for that team
//   Hold ≥ 1.5s:       undo last point
//   Hold ≥ 3.0s:       reset game
// Clip arms:           TOP of pod only — clips over 5.49mm edge guard (measured)
// VHB recess:          Full-length back face, 0.8mm deep
// XIAO nRF52840:       22 × 18.5 × 4mm pocket (z: floor to floor+4mm)
// LiPo battery:        13 × 26 × 3.5mm pocket (z: floor+4mm to floor+7.5mm, stacked above XIAO)
//   Recommended cell:  251225  (2.5mm × 12mm × 25mm, ~60mAh) or 301225 (~80mAh)
// USB-C cutout:        9 × 4mm through TOP wall — programs XIAO + charges LiPo
// Assembly:            4× M1.6 screws (corner positions adapt to taper)
// Material:            TPU 95A recommended (flexible, grippy clip arms)
// Phase 2 chip:        Seeed XIAO nRF52840 (21 × 17.5mm)
// Phase 3 chip:        Raytac MDBT50Q (15.5 × 10.5 × 2mm) — custom PCB
// ============================================================
